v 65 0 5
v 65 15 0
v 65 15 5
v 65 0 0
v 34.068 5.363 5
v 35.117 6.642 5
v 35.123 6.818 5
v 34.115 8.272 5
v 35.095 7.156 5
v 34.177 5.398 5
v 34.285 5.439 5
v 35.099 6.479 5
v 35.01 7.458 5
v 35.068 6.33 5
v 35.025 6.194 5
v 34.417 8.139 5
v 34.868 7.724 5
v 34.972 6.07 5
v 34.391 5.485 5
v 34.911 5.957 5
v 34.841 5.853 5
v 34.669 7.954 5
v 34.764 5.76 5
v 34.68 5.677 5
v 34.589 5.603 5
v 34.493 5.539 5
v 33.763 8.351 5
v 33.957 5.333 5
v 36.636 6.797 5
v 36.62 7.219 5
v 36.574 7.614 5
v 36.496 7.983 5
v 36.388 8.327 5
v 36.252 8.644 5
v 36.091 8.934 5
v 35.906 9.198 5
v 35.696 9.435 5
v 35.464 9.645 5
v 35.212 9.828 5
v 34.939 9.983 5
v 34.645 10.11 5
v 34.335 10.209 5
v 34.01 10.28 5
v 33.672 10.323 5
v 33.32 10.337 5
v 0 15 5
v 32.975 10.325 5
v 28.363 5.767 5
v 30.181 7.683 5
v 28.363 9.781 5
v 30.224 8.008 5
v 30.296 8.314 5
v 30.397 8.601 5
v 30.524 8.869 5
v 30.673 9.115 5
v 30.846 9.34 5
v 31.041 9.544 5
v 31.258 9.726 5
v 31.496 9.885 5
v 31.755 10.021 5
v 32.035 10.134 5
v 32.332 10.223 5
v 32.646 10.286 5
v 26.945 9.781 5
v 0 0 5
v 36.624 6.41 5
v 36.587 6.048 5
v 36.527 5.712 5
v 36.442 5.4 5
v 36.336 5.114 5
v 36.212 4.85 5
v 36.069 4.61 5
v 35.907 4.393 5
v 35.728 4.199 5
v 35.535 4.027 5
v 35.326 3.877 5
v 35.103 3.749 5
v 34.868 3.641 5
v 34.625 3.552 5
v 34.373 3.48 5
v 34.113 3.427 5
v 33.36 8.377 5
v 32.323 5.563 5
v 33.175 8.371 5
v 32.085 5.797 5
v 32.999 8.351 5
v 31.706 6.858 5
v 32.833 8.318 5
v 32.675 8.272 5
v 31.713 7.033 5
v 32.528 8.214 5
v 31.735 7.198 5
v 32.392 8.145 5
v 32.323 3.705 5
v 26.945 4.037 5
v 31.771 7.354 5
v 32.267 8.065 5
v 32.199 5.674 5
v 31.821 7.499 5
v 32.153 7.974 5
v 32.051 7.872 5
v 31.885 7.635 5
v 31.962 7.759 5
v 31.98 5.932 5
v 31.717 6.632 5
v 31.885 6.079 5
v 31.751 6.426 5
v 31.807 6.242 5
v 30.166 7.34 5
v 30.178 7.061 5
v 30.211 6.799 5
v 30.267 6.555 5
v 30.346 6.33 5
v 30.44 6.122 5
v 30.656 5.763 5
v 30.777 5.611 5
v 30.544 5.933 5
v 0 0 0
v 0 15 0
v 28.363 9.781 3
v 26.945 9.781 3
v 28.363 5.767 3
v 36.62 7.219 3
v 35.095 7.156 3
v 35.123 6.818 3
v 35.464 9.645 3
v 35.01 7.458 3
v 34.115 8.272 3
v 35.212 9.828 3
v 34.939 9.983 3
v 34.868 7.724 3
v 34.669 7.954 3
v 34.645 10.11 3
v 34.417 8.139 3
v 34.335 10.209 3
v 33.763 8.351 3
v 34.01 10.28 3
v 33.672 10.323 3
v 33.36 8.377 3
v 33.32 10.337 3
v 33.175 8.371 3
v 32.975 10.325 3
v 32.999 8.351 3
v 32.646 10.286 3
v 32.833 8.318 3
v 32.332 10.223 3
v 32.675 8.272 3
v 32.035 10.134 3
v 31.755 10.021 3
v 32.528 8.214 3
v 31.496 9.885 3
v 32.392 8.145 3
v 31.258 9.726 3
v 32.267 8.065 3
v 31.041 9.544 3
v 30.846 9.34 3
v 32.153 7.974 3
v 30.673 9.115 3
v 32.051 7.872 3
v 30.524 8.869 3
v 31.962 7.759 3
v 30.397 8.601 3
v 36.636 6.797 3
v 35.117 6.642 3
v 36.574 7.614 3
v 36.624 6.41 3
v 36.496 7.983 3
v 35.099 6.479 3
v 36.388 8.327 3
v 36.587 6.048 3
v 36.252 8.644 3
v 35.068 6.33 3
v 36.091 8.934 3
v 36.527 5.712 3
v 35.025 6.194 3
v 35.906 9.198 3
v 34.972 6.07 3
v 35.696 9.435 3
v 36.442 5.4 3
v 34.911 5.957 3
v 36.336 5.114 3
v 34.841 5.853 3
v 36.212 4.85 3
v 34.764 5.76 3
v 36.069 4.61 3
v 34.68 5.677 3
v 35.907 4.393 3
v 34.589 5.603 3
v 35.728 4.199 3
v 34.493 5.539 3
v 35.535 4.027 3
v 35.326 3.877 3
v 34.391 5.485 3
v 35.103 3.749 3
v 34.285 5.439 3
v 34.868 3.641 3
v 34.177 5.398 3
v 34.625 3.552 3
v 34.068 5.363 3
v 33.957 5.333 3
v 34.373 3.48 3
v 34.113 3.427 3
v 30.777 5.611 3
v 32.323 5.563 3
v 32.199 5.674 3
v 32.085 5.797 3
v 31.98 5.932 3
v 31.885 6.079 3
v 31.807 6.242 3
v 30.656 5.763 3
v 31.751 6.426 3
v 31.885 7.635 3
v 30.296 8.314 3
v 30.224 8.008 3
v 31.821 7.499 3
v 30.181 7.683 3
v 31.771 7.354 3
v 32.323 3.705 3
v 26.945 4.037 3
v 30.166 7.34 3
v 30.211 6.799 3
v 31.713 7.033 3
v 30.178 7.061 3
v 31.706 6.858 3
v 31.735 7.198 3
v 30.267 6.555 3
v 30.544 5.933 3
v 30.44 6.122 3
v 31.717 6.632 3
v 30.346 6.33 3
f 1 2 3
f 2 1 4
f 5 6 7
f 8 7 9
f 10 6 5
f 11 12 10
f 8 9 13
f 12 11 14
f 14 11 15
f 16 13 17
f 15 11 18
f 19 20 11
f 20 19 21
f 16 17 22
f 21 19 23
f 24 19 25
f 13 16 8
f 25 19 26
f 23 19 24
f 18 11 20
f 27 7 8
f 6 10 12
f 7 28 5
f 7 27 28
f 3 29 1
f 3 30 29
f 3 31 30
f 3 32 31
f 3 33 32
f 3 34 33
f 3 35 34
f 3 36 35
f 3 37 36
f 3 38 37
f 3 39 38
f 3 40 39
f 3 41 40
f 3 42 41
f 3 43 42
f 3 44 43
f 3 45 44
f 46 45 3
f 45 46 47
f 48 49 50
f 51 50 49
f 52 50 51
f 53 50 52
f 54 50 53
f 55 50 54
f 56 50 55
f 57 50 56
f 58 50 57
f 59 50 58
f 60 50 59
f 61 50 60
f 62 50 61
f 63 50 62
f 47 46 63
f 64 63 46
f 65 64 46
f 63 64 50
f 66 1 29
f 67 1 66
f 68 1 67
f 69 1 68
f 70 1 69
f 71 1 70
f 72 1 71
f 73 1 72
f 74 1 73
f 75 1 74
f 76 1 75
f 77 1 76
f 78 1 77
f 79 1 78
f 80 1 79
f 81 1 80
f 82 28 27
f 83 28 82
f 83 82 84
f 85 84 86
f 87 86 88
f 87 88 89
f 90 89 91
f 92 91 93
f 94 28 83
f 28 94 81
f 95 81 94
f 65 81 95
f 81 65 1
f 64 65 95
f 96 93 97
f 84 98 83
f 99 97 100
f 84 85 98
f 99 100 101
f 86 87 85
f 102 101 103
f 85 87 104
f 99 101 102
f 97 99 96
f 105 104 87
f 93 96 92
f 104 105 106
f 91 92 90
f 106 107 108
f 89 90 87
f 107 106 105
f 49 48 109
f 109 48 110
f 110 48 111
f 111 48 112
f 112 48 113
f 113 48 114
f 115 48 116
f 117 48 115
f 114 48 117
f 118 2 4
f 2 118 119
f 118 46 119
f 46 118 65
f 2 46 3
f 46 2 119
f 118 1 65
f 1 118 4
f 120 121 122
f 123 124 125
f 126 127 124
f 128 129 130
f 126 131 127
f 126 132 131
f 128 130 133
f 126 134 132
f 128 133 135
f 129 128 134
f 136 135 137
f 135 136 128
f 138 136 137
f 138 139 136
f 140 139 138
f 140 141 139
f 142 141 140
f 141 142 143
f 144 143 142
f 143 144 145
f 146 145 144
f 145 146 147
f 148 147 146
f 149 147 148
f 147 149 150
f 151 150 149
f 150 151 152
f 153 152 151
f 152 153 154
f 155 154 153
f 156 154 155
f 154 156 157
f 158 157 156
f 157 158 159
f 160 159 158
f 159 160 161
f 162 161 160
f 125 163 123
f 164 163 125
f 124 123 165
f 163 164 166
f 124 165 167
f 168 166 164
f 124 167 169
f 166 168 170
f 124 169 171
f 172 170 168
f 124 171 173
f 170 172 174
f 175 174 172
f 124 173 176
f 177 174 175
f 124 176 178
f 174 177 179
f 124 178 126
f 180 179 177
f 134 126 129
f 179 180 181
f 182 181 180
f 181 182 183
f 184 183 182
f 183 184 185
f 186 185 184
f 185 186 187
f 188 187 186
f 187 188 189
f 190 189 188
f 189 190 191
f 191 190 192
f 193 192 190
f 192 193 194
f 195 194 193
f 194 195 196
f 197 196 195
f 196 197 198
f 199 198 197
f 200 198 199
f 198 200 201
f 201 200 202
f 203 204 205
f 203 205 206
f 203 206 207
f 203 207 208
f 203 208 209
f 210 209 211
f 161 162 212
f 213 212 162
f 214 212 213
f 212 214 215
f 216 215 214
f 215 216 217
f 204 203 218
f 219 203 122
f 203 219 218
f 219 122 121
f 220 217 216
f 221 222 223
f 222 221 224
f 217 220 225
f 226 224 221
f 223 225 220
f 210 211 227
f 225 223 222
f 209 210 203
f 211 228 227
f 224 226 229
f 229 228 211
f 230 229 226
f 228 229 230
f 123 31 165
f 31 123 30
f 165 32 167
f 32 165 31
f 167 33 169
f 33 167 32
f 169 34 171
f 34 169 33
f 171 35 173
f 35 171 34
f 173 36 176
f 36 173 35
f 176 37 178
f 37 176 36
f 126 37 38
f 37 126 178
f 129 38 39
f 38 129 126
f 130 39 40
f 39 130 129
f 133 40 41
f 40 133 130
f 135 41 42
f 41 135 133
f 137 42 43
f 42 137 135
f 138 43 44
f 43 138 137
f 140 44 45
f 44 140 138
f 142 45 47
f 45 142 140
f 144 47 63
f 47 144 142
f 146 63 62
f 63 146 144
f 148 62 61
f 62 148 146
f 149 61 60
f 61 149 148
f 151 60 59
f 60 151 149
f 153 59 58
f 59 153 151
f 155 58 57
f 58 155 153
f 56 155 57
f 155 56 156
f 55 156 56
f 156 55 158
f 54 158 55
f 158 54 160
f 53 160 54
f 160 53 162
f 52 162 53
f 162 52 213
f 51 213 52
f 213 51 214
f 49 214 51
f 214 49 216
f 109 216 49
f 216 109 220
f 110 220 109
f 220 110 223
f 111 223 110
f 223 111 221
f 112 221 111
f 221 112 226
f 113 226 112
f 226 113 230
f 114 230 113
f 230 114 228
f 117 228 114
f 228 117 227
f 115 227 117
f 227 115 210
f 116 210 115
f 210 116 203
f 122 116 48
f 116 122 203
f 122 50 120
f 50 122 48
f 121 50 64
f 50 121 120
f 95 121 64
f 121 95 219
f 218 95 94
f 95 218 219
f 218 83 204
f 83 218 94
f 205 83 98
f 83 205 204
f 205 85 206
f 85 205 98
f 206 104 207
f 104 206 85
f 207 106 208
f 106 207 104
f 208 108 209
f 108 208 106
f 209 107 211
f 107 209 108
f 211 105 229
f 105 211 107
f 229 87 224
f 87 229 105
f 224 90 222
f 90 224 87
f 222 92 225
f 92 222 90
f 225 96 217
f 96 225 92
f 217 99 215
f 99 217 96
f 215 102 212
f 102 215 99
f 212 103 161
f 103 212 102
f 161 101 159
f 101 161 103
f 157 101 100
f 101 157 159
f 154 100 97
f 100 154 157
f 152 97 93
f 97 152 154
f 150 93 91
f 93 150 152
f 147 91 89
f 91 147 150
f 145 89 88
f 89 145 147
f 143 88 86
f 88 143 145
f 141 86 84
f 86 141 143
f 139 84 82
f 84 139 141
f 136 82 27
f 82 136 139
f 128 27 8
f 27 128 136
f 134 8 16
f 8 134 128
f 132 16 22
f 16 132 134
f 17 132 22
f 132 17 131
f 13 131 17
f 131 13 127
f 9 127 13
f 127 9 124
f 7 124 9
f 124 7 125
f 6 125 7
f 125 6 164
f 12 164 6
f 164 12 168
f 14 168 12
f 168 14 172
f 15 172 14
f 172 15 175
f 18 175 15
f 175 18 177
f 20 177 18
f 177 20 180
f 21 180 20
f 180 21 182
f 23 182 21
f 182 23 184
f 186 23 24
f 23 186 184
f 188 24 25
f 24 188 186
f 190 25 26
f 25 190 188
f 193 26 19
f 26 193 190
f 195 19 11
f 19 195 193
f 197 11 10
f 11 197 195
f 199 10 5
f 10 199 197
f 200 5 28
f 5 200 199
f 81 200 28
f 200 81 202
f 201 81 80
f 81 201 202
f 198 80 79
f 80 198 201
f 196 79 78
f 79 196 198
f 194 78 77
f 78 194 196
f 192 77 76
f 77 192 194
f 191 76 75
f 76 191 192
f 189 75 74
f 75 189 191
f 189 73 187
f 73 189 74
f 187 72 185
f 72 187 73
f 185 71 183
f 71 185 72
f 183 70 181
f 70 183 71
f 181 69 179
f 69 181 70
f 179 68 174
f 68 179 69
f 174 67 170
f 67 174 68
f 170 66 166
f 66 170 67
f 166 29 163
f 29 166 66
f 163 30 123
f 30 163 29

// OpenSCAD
difference(){
	union(){ 
        translate([0,0,0]){
           cube([65,15,5], center=false);
        }                
	}
	union() {
        translate([60-65/2+9, 3,3]){
            linear_extrude(height = 10) {
                rotate([0,0,90]){
                    text("5", size = 10, font="Arial:style=Bold");
                }
            }
        }                


	}
}
